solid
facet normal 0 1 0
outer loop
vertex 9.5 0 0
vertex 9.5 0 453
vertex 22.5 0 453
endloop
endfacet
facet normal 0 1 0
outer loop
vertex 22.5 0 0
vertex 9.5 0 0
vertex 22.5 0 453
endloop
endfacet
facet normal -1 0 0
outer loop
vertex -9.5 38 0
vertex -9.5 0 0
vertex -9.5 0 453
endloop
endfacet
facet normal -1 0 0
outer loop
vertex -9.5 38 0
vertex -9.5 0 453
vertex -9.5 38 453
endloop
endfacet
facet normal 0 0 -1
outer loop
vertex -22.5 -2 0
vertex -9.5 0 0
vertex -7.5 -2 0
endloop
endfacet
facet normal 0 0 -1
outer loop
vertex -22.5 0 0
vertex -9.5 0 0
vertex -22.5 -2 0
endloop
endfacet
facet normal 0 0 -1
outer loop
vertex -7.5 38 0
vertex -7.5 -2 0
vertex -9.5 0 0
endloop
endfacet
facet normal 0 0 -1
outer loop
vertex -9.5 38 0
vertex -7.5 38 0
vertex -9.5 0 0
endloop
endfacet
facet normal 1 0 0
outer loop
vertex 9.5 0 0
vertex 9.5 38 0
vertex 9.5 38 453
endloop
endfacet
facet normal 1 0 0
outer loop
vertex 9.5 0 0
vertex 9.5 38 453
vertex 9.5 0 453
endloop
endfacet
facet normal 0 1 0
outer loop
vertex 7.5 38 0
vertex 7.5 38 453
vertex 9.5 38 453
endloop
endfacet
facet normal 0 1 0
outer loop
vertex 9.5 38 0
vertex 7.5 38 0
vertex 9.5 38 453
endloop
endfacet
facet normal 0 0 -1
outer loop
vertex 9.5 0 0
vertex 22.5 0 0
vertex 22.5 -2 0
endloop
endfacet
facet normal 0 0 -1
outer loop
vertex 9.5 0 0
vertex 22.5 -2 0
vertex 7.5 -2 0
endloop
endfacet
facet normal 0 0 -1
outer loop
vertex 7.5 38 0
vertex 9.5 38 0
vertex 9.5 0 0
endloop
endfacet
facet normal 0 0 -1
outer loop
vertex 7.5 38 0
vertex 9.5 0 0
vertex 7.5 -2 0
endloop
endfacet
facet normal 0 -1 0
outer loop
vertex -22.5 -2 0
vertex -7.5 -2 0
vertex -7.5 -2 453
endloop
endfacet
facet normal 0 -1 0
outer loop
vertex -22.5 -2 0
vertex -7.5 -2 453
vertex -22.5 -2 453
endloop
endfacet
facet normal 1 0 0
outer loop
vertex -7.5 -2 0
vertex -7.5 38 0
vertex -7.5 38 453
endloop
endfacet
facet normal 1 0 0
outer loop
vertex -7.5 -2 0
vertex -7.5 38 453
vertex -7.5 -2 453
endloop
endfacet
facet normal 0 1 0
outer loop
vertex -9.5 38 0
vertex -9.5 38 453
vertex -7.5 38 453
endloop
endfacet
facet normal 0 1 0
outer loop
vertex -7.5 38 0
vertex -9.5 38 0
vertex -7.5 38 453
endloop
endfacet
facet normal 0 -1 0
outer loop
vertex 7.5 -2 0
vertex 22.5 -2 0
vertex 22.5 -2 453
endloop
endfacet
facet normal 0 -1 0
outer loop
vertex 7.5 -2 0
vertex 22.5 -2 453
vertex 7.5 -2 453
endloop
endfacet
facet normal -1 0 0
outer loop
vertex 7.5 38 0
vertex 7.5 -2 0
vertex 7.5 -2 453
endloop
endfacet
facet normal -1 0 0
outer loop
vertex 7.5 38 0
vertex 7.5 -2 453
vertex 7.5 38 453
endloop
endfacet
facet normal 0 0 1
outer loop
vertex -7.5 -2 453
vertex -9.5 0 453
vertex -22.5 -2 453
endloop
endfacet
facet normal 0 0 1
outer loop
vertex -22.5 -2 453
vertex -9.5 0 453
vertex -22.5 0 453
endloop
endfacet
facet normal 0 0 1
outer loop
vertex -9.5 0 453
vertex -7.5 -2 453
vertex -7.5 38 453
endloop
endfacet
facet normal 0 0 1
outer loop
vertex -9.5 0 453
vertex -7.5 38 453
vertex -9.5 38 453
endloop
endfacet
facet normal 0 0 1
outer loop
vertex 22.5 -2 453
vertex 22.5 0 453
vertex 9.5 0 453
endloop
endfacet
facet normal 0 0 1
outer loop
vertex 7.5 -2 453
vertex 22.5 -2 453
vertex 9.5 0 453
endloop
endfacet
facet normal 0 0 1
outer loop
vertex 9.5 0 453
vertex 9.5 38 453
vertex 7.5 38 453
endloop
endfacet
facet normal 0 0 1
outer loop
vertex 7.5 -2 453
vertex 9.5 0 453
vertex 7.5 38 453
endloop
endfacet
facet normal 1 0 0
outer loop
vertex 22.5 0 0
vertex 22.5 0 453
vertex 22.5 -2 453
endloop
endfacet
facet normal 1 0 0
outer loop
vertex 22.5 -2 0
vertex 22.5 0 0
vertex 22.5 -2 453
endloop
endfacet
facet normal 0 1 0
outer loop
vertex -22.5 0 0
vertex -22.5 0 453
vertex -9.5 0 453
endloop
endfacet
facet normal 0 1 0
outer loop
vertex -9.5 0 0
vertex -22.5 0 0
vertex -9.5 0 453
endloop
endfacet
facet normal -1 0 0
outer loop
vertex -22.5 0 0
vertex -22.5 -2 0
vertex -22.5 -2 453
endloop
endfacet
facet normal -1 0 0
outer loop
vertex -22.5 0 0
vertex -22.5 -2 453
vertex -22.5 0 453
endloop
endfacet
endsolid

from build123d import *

# Parameters (mm, degrees)
PAD_DEPTH = 453


with BuildPart() as part:
    # Sketch → Pad (new body)
    with BuildSketch(Plane.XY):
        Polygon((-9.5, 38), (-7.5, 38), (-7.5, -2), (-22.5, -2), (-22.5, 0), (-9.5, 0), align=None)
        Polygon((7.5, -2), (7.5, 38), (9.5, 38), (9.5, 0), (22.5, 0), (22.5, -2), align=None)
    extrude(amount=PAD_DEPTH)


solid = part.part
